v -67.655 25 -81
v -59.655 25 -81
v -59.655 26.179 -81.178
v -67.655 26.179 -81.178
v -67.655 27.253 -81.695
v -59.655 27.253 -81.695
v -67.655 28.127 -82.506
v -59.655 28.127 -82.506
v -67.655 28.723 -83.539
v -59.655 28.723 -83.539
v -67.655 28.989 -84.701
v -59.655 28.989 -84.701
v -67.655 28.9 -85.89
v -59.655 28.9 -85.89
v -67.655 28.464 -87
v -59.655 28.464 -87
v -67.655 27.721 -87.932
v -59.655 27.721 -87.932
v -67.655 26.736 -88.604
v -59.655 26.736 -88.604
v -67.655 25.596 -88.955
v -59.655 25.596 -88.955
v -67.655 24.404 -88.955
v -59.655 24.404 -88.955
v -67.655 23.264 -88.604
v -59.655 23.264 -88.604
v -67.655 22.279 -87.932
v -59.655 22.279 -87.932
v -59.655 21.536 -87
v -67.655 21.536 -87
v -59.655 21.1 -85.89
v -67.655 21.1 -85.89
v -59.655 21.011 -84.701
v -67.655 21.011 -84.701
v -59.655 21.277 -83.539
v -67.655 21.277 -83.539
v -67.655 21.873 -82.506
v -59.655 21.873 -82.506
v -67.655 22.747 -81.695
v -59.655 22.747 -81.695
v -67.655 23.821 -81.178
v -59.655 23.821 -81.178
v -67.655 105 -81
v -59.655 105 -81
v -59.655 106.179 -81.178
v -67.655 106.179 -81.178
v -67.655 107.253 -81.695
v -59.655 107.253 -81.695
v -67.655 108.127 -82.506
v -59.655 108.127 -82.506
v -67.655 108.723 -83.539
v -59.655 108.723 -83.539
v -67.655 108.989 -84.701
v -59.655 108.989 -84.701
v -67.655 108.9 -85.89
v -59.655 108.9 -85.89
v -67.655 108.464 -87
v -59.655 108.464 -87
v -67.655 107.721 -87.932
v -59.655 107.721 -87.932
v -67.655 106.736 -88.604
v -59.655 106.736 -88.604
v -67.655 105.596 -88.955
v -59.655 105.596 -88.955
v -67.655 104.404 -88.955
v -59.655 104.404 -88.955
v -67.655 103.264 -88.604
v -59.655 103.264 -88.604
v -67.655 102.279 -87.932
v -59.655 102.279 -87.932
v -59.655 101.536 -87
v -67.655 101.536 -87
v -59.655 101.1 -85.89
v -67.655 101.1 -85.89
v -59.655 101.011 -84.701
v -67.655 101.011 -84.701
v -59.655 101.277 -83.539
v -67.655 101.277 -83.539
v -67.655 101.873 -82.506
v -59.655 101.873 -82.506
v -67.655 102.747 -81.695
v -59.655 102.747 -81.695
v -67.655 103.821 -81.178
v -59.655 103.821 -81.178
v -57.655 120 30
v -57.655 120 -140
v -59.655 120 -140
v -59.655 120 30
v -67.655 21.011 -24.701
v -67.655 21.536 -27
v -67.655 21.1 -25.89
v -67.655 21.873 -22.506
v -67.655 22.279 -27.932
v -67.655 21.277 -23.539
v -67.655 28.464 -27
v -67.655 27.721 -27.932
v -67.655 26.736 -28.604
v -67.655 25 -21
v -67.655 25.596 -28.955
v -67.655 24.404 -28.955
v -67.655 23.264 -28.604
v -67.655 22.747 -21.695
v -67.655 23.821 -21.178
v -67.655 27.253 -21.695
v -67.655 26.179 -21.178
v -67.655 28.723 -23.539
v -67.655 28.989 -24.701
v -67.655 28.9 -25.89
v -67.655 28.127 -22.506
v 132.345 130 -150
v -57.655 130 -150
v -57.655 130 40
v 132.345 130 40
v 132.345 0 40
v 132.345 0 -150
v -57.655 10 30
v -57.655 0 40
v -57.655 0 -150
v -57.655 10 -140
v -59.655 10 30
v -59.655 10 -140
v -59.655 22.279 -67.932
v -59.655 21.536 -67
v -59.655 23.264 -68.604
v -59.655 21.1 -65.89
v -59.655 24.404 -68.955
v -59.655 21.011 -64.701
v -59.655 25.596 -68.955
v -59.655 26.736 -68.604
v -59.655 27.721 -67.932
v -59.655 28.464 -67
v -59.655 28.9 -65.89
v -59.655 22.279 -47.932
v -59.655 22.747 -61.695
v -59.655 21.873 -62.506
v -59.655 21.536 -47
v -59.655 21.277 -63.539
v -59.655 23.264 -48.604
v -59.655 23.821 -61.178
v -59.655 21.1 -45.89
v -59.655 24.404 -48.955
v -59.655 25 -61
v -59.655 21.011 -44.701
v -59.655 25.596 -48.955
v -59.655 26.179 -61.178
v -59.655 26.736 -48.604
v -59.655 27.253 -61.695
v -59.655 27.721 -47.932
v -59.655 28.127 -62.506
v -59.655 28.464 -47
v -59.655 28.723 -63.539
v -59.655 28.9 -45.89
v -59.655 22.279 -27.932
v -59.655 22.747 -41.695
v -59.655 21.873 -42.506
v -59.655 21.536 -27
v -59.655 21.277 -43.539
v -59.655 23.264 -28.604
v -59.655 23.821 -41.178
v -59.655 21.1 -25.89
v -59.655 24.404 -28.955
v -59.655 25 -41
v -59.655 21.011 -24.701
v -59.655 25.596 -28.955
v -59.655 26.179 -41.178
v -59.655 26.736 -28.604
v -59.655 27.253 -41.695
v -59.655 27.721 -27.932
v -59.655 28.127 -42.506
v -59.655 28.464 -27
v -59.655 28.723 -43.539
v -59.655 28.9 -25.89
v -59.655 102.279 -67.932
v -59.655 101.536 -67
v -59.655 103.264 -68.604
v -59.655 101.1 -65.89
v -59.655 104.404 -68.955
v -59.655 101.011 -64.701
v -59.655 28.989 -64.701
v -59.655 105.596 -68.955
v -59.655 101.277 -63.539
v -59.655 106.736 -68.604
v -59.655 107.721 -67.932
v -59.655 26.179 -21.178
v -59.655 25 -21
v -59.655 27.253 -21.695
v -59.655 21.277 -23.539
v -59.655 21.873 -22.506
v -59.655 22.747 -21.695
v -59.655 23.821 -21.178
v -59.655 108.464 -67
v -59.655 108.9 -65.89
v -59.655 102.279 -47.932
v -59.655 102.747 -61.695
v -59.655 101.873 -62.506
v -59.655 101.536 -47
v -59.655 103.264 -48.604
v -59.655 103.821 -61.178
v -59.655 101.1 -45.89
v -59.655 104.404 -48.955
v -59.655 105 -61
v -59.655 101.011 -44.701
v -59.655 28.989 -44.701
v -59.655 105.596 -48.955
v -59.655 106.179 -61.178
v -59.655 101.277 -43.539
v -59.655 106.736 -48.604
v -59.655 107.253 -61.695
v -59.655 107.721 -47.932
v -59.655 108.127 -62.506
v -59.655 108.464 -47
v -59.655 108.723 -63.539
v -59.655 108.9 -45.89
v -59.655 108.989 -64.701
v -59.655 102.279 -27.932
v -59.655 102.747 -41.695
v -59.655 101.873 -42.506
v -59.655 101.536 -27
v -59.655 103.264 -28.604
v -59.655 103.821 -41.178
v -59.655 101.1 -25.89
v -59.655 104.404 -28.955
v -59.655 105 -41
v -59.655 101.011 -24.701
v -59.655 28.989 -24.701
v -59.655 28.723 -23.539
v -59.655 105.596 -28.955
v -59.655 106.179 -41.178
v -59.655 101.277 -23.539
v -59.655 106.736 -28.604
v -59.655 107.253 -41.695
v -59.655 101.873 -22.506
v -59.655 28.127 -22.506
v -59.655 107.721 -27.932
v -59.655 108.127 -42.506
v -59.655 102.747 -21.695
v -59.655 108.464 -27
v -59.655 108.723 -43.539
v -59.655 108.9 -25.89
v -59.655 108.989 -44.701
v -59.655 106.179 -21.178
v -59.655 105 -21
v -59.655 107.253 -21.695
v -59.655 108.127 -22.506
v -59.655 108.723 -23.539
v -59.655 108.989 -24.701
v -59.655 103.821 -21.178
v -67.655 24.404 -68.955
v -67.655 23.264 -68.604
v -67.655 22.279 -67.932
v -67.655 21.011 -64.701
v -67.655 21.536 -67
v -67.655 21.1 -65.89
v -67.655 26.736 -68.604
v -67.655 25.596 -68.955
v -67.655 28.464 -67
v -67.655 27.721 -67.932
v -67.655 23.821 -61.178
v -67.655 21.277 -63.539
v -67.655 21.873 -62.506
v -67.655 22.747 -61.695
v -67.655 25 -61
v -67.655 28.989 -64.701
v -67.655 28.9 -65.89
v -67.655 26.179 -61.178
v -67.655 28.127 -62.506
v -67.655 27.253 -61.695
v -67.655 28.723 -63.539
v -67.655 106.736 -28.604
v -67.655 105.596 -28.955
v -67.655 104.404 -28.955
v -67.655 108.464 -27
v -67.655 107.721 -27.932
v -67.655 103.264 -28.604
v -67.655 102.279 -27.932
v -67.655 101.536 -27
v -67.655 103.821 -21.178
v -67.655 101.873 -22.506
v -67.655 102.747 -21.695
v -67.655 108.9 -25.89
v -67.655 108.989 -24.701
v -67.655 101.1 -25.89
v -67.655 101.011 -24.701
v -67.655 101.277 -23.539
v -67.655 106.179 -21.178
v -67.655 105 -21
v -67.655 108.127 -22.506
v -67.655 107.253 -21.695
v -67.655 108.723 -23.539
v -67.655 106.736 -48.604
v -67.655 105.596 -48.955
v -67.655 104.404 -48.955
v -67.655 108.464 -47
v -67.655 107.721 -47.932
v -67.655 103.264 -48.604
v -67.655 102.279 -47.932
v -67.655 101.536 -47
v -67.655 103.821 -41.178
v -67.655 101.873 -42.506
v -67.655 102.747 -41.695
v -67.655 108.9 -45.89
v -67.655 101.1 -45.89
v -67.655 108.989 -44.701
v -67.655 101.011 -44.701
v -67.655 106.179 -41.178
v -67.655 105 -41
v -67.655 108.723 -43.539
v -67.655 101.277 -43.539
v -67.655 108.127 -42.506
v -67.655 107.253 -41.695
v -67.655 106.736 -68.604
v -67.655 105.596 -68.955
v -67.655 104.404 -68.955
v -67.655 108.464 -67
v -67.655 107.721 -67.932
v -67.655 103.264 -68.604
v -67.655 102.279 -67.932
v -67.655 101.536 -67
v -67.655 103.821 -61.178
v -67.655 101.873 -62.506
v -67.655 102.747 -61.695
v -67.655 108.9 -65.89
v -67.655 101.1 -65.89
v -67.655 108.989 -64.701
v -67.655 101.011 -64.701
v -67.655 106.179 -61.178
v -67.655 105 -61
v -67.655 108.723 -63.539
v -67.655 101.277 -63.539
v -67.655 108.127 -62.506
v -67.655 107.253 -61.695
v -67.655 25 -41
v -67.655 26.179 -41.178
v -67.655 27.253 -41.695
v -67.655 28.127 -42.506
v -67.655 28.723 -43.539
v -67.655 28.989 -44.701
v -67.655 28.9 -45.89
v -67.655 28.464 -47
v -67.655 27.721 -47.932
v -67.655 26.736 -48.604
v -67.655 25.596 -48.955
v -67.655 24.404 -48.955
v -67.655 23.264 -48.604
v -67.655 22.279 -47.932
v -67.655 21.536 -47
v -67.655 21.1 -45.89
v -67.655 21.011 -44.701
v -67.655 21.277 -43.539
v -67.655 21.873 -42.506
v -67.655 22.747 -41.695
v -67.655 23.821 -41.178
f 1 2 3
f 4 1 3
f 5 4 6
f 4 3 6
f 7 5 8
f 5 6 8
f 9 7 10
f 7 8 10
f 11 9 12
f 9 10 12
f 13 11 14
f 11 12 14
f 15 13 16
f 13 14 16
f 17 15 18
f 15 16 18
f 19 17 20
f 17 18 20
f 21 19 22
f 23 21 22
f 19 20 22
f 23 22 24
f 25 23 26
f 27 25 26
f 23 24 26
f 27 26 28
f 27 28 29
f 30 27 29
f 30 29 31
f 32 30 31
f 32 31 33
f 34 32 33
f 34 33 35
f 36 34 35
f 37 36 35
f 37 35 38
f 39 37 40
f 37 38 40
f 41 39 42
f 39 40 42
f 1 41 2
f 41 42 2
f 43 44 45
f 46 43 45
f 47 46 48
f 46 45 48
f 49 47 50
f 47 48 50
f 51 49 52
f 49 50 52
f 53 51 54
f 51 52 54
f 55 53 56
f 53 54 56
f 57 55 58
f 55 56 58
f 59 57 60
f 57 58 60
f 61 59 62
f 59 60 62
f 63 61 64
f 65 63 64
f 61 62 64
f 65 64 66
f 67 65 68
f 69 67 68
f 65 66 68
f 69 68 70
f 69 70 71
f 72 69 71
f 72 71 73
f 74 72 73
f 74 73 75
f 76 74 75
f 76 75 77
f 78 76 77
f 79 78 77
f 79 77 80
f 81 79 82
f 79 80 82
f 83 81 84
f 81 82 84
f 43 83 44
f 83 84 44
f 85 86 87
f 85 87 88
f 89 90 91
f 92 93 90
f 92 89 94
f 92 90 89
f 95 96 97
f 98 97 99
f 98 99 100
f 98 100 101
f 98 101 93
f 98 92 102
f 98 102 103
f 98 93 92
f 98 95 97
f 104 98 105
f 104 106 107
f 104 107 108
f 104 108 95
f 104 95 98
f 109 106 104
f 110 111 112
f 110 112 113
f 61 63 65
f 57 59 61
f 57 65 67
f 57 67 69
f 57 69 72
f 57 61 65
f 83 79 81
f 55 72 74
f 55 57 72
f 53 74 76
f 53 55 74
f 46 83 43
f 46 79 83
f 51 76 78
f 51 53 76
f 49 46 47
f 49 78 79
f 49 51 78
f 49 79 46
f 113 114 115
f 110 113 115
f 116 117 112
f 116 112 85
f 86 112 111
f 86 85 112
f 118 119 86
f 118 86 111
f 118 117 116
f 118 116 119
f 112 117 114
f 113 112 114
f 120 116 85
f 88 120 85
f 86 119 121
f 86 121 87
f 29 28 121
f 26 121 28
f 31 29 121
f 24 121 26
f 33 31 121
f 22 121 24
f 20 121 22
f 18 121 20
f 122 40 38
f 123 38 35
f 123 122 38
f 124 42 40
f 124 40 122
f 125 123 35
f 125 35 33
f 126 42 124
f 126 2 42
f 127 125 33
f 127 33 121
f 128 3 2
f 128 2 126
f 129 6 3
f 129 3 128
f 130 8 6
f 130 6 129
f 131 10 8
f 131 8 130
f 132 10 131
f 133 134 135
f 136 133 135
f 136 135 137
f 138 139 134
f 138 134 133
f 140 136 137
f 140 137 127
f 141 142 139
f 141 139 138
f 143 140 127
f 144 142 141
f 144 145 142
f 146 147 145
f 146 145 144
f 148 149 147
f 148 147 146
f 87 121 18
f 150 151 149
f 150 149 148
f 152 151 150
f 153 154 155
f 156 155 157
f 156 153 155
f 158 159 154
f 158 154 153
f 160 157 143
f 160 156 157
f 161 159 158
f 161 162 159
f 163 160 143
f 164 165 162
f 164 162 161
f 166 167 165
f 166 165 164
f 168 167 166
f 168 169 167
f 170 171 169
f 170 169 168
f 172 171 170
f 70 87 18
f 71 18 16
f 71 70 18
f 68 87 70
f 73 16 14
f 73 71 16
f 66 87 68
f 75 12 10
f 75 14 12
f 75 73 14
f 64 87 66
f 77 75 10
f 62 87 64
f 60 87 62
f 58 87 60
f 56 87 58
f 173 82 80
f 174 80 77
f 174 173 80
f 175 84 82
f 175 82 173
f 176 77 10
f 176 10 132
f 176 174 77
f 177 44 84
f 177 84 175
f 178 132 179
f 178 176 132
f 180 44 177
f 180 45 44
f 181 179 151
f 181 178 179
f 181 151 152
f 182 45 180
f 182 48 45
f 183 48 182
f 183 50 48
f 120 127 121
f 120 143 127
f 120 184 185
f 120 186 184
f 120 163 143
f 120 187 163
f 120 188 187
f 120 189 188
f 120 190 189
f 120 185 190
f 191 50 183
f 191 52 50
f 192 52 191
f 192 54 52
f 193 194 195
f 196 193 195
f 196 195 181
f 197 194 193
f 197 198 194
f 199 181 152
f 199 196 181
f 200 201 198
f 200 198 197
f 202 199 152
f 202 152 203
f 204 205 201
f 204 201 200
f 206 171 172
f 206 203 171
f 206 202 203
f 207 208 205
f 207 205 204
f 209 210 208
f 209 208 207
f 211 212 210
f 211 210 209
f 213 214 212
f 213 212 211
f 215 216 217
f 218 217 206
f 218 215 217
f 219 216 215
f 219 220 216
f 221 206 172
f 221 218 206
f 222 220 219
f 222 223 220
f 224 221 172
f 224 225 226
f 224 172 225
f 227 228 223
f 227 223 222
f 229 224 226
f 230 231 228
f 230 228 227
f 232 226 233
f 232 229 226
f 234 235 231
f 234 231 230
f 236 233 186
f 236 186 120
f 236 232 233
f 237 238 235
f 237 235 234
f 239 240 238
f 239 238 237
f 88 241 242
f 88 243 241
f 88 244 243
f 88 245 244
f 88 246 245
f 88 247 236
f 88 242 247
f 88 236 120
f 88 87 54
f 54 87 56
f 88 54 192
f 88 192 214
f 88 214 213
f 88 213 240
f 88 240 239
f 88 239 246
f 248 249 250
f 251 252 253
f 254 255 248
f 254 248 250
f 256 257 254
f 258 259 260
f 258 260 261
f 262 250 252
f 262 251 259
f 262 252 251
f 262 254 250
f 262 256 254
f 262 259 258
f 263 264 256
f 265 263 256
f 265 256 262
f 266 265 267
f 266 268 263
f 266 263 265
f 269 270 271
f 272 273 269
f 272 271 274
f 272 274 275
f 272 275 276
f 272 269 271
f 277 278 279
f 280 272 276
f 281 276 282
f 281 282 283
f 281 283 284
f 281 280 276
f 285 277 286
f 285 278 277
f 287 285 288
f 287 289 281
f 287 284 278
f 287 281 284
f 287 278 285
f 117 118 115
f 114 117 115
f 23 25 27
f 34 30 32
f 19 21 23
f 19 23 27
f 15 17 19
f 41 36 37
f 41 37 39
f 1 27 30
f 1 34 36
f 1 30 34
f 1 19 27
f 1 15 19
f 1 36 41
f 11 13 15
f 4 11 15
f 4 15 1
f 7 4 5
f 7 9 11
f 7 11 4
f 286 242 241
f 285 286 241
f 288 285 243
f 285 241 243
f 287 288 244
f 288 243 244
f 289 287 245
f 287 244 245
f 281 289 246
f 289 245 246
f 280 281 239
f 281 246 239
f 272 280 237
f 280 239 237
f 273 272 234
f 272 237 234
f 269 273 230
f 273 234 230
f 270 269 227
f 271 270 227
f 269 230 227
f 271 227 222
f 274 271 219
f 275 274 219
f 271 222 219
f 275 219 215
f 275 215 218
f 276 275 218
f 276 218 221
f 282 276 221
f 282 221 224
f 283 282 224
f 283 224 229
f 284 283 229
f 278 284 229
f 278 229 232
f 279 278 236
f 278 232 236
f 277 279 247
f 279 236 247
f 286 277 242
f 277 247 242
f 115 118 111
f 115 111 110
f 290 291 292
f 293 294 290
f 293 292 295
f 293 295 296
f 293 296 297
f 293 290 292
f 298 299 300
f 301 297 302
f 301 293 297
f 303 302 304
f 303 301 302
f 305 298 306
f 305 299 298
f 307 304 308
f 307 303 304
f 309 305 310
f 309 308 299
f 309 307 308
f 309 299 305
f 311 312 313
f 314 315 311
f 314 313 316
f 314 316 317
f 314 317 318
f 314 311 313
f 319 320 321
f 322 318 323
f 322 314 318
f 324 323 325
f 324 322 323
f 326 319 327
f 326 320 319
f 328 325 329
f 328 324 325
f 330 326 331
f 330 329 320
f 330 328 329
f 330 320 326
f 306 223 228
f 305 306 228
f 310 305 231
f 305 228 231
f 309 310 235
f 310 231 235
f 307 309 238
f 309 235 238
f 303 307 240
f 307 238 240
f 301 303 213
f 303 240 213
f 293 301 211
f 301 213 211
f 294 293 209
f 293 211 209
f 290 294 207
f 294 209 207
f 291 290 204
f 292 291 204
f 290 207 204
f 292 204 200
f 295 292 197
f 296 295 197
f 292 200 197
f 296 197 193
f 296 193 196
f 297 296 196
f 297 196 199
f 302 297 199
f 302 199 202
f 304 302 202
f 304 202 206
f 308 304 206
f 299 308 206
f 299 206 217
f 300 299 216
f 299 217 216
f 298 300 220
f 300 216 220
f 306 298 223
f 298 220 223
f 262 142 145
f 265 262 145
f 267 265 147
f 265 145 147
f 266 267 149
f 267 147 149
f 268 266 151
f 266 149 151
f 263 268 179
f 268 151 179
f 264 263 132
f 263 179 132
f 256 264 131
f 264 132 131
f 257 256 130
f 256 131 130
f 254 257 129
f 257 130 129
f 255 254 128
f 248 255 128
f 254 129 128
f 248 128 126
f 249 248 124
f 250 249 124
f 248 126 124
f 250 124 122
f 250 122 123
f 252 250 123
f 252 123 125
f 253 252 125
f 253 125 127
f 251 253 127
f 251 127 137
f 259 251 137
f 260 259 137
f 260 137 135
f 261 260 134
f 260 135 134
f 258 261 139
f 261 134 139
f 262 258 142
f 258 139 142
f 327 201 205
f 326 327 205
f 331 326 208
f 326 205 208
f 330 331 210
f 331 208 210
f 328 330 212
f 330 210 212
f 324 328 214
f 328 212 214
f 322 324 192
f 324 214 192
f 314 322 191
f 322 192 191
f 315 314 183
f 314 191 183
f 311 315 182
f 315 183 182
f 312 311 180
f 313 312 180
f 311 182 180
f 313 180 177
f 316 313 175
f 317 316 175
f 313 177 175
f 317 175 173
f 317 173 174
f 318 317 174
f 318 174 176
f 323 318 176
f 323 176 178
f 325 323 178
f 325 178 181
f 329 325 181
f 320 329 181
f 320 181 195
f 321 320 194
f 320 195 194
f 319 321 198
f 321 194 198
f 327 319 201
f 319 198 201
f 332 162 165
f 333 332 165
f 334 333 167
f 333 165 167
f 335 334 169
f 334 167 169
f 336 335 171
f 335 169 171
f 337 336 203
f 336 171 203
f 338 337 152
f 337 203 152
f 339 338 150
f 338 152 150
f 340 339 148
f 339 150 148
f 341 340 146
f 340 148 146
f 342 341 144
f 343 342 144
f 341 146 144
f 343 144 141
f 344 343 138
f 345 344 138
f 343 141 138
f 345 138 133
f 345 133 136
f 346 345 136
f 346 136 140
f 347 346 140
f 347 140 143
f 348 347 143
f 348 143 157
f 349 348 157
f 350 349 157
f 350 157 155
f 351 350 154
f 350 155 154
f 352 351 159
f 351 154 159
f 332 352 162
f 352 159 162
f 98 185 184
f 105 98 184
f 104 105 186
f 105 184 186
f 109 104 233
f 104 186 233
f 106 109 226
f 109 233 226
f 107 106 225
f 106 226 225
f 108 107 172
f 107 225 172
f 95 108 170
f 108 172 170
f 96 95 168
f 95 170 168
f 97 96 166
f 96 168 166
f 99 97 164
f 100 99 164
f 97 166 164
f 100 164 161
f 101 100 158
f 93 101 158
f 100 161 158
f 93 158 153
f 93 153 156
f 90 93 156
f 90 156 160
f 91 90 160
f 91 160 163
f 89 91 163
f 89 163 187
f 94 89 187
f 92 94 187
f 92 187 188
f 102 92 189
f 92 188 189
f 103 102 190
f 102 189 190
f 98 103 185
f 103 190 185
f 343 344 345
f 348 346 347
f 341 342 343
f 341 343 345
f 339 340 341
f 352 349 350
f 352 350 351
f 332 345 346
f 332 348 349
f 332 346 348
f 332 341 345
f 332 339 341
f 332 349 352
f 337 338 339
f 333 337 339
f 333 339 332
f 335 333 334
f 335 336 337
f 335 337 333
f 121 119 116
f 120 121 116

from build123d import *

# Parameters (mm, degrees)
SKETCH2_W           = 190
SKETCH2_H           = 190
BOSS_EXTRUDE1_DEPTH = 130
SKETCH3_W           = 170
SKETCH3_H           = 110
BOSS_EXTRUDE2_DEPTH = 2
SKETCH4_R           = 4
BOSS_EXTRUDE3_DEPTH = 8


with BuildPart() as part:
    # Sketch2 → Boss-Extrude1 (new body)
    with BuildSketch(Plane(origin=(0, 0, 0), x_dir=(1, 0, 0), z_dir=(0, 1, 0))):
        with Locations((37.344584985, 55)):
            Rectangle(SKETCH2_W, SKETCH2_H)
    extrude(amount=BOSS_EXTRUDE1_DEPTH)

    # Sketch3 → Boss-Extrude2 (add)
    with BuildSketch(Plane.ZY.offset(57.655415015)):
        with Locations((-55, 65)):
            Rectangle(SKETCH3_W, SKETCH3_H)
    extrude(amount=BOSS_EXTRUDE2_DEPTH)

    # Sketch4 → Boss-Extrude3 (add)
    with BuildSketch(Plane.ZY.offset(59.655415015)):
        with Locations((-25, 25)):
            Circle(SKETCH4_R)
        with Locations((-45, 25)):
            Circle(SKETCH4_R)
        with Locations((-25, 105)):
            Circle(SKETCH4_R)
        with Locations((-65, 25)):
            Circle(SKETCH4_R)
        with Locations((-85, 25)):
            Circle(SKETCH4_R)
        with Locations((-45, 105)):
            Circle(SKETCH4_R)
        with Locations((-65, 105)):
            Circle(SKETCH4_R)
        with Locations((-85, 105)):
            Circle(SKETCH4_R)
    extrude(amount=BOSS_EXTRUDE3_DEPTH)


solid = part.part
